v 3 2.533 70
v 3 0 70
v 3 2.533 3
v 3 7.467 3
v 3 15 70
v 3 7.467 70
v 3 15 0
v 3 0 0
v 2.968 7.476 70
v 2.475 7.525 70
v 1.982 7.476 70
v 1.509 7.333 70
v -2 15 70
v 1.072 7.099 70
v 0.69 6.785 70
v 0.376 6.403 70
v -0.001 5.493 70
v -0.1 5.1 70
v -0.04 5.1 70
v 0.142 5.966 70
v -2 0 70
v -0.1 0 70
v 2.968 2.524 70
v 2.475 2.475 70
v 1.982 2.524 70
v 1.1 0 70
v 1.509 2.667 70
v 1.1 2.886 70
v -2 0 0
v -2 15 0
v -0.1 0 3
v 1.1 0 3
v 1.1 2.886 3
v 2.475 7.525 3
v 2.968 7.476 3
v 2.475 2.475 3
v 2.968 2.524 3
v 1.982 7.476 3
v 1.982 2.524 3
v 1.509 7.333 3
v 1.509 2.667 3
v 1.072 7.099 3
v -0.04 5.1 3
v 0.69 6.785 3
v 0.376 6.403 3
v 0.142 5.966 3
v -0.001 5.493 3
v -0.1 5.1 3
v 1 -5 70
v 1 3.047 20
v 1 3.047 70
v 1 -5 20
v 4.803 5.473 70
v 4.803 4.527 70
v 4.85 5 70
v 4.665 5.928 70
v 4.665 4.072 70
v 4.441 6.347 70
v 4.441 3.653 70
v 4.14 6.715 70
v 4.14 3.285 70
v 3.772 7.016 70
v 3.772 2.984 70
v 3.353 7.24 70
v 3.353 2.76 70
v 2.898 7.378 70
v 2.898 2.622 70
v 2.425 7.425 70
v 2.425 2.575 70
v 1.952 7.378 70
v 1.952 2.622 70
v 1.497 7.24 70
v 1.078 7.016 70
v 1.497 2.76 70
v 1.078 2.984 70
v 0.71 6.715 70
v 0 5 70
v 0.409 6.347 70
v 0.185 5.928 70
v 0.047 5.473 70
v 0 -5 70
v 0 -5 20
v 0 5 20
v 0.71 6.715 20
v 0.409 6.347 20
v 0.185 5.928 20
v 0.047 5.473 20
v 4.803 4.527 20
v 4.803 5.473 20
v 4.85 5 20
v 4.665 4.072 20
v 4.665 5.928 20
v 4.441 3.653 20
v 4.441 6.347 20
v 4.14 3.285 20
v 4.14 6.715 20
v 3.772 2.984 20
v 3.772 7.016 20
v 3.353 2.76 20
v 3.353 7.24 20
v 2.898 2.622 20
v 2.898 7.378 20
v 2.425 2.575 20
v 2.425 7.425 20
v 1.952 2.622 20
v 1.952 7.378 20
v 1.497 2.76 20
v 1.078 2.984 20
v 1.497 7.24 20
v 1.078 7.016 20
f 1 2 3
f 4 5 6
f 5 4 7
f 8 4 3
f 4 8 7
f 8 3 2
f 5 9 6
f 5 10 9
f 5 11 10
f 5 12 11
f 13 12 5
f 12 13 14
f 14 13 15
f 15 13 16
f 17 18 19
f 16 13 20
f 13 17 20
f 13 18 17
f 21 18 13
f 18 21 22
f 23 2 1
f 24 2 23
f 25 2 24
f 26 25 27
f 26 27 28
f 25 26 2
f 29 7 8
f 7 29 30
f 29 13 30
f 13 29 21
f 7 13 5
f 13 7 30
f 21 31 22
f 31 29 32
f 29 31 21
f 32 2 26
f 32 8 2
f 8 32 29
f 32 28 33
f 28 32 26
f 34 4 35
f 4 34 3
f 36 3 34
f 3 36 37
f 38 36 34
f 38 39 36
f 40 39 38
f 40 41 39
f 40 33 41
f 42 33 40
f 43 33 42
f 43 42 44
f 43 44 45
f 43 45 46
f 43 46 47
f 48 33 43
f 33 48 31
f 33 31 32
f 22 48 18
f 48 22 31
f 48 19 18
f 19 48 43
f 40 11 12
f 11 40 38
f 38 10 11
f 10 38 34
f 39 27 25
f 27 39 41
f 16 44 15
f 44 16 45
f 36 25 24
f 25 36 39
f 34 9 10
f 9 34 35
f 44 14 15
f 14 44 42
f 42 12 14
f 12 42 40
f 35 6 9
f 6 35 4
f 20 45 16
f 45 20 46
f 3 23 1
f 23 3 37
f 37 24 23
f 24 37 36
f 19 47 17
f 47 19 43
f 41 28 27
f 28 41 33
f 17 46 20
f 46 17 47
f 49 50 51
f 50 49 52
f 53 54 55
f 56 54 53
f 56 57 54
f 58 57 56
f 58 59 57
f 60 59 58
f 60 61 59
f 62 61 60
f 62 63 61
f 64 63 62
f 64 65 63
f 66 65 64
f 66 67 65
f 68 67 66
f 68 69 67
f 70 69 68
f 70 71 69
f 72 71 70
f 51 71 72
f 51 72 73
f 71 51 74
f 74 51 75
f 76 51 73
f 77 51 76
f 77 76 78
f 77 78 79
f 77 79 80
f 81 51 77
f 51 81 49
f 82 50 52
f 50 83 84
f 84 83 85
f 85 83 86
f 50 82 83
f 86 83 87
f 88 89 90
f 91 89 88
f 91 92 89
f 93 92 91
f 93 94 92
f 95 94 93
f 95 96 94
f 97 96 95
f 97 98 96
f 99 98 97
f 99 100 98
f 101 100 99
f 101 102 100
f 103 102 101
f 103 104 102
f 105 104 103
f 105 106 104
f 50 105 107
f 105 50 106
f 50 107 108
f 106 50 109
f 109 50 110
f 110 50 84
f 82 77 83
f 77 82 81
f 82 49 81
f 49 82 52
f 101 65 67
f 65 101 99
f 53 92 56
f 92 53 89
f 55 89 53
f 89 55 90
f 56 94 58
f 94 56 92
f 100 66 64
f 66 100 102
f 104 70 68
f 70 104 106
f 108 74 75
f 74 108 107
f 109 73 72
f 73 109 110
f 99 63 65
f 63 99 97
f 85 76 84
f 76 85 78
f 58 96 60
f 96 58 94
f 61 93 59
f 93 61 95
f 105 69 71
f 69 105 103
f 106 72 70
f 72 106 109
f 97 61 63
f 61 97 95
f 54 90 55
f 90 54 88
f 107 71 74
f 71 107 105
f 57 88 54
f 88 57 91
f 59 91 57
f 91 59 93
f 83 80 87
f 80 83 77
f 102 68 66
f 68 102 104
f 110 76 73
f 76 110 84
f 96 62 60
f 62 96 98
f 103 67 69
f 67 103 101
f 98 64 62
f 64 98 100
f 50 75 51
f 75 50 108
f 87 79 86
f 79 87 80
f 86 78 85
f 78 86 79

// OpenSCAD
screw_diameter = 4.95;
gap = 0.1;
thickness = 5;
flag_thickness = 1;
height = 70;
base_height = 3;
min_spring_height = 17;

module holder() {
    difference() {
        translate([-thickness/2+flag_thickness/2, 0, 0]) {
            cube([thickness, 15, 70]);
        }
        translate([-gap, -5-1, base_height]) {
            cube([flag_thickness+2*gap, 10+gap+1, height-base_height+1]);
        }
        translate([screw_diameter/2, 5, base_height]) {
            cylinder(d=screw_diameter+gap, h=height-base_height+1, $fn=32);
        }
    }
}

module flag() {
    union() {
        translate([0, -5, base_height+min_spring_height]) {
            cube([flag_thickness, 10, height-base_height-min_spring_height]);
        }
        translate([(screw_diameter-gap)/2, 5, base_height+min_spring_height]) {
            cylinder(d=screw_diameter-gap, h=height-base_height-min_spring_height, $fn=32);
        }
    }
}

holder();
color([0.8, 0, 0]) flag();
